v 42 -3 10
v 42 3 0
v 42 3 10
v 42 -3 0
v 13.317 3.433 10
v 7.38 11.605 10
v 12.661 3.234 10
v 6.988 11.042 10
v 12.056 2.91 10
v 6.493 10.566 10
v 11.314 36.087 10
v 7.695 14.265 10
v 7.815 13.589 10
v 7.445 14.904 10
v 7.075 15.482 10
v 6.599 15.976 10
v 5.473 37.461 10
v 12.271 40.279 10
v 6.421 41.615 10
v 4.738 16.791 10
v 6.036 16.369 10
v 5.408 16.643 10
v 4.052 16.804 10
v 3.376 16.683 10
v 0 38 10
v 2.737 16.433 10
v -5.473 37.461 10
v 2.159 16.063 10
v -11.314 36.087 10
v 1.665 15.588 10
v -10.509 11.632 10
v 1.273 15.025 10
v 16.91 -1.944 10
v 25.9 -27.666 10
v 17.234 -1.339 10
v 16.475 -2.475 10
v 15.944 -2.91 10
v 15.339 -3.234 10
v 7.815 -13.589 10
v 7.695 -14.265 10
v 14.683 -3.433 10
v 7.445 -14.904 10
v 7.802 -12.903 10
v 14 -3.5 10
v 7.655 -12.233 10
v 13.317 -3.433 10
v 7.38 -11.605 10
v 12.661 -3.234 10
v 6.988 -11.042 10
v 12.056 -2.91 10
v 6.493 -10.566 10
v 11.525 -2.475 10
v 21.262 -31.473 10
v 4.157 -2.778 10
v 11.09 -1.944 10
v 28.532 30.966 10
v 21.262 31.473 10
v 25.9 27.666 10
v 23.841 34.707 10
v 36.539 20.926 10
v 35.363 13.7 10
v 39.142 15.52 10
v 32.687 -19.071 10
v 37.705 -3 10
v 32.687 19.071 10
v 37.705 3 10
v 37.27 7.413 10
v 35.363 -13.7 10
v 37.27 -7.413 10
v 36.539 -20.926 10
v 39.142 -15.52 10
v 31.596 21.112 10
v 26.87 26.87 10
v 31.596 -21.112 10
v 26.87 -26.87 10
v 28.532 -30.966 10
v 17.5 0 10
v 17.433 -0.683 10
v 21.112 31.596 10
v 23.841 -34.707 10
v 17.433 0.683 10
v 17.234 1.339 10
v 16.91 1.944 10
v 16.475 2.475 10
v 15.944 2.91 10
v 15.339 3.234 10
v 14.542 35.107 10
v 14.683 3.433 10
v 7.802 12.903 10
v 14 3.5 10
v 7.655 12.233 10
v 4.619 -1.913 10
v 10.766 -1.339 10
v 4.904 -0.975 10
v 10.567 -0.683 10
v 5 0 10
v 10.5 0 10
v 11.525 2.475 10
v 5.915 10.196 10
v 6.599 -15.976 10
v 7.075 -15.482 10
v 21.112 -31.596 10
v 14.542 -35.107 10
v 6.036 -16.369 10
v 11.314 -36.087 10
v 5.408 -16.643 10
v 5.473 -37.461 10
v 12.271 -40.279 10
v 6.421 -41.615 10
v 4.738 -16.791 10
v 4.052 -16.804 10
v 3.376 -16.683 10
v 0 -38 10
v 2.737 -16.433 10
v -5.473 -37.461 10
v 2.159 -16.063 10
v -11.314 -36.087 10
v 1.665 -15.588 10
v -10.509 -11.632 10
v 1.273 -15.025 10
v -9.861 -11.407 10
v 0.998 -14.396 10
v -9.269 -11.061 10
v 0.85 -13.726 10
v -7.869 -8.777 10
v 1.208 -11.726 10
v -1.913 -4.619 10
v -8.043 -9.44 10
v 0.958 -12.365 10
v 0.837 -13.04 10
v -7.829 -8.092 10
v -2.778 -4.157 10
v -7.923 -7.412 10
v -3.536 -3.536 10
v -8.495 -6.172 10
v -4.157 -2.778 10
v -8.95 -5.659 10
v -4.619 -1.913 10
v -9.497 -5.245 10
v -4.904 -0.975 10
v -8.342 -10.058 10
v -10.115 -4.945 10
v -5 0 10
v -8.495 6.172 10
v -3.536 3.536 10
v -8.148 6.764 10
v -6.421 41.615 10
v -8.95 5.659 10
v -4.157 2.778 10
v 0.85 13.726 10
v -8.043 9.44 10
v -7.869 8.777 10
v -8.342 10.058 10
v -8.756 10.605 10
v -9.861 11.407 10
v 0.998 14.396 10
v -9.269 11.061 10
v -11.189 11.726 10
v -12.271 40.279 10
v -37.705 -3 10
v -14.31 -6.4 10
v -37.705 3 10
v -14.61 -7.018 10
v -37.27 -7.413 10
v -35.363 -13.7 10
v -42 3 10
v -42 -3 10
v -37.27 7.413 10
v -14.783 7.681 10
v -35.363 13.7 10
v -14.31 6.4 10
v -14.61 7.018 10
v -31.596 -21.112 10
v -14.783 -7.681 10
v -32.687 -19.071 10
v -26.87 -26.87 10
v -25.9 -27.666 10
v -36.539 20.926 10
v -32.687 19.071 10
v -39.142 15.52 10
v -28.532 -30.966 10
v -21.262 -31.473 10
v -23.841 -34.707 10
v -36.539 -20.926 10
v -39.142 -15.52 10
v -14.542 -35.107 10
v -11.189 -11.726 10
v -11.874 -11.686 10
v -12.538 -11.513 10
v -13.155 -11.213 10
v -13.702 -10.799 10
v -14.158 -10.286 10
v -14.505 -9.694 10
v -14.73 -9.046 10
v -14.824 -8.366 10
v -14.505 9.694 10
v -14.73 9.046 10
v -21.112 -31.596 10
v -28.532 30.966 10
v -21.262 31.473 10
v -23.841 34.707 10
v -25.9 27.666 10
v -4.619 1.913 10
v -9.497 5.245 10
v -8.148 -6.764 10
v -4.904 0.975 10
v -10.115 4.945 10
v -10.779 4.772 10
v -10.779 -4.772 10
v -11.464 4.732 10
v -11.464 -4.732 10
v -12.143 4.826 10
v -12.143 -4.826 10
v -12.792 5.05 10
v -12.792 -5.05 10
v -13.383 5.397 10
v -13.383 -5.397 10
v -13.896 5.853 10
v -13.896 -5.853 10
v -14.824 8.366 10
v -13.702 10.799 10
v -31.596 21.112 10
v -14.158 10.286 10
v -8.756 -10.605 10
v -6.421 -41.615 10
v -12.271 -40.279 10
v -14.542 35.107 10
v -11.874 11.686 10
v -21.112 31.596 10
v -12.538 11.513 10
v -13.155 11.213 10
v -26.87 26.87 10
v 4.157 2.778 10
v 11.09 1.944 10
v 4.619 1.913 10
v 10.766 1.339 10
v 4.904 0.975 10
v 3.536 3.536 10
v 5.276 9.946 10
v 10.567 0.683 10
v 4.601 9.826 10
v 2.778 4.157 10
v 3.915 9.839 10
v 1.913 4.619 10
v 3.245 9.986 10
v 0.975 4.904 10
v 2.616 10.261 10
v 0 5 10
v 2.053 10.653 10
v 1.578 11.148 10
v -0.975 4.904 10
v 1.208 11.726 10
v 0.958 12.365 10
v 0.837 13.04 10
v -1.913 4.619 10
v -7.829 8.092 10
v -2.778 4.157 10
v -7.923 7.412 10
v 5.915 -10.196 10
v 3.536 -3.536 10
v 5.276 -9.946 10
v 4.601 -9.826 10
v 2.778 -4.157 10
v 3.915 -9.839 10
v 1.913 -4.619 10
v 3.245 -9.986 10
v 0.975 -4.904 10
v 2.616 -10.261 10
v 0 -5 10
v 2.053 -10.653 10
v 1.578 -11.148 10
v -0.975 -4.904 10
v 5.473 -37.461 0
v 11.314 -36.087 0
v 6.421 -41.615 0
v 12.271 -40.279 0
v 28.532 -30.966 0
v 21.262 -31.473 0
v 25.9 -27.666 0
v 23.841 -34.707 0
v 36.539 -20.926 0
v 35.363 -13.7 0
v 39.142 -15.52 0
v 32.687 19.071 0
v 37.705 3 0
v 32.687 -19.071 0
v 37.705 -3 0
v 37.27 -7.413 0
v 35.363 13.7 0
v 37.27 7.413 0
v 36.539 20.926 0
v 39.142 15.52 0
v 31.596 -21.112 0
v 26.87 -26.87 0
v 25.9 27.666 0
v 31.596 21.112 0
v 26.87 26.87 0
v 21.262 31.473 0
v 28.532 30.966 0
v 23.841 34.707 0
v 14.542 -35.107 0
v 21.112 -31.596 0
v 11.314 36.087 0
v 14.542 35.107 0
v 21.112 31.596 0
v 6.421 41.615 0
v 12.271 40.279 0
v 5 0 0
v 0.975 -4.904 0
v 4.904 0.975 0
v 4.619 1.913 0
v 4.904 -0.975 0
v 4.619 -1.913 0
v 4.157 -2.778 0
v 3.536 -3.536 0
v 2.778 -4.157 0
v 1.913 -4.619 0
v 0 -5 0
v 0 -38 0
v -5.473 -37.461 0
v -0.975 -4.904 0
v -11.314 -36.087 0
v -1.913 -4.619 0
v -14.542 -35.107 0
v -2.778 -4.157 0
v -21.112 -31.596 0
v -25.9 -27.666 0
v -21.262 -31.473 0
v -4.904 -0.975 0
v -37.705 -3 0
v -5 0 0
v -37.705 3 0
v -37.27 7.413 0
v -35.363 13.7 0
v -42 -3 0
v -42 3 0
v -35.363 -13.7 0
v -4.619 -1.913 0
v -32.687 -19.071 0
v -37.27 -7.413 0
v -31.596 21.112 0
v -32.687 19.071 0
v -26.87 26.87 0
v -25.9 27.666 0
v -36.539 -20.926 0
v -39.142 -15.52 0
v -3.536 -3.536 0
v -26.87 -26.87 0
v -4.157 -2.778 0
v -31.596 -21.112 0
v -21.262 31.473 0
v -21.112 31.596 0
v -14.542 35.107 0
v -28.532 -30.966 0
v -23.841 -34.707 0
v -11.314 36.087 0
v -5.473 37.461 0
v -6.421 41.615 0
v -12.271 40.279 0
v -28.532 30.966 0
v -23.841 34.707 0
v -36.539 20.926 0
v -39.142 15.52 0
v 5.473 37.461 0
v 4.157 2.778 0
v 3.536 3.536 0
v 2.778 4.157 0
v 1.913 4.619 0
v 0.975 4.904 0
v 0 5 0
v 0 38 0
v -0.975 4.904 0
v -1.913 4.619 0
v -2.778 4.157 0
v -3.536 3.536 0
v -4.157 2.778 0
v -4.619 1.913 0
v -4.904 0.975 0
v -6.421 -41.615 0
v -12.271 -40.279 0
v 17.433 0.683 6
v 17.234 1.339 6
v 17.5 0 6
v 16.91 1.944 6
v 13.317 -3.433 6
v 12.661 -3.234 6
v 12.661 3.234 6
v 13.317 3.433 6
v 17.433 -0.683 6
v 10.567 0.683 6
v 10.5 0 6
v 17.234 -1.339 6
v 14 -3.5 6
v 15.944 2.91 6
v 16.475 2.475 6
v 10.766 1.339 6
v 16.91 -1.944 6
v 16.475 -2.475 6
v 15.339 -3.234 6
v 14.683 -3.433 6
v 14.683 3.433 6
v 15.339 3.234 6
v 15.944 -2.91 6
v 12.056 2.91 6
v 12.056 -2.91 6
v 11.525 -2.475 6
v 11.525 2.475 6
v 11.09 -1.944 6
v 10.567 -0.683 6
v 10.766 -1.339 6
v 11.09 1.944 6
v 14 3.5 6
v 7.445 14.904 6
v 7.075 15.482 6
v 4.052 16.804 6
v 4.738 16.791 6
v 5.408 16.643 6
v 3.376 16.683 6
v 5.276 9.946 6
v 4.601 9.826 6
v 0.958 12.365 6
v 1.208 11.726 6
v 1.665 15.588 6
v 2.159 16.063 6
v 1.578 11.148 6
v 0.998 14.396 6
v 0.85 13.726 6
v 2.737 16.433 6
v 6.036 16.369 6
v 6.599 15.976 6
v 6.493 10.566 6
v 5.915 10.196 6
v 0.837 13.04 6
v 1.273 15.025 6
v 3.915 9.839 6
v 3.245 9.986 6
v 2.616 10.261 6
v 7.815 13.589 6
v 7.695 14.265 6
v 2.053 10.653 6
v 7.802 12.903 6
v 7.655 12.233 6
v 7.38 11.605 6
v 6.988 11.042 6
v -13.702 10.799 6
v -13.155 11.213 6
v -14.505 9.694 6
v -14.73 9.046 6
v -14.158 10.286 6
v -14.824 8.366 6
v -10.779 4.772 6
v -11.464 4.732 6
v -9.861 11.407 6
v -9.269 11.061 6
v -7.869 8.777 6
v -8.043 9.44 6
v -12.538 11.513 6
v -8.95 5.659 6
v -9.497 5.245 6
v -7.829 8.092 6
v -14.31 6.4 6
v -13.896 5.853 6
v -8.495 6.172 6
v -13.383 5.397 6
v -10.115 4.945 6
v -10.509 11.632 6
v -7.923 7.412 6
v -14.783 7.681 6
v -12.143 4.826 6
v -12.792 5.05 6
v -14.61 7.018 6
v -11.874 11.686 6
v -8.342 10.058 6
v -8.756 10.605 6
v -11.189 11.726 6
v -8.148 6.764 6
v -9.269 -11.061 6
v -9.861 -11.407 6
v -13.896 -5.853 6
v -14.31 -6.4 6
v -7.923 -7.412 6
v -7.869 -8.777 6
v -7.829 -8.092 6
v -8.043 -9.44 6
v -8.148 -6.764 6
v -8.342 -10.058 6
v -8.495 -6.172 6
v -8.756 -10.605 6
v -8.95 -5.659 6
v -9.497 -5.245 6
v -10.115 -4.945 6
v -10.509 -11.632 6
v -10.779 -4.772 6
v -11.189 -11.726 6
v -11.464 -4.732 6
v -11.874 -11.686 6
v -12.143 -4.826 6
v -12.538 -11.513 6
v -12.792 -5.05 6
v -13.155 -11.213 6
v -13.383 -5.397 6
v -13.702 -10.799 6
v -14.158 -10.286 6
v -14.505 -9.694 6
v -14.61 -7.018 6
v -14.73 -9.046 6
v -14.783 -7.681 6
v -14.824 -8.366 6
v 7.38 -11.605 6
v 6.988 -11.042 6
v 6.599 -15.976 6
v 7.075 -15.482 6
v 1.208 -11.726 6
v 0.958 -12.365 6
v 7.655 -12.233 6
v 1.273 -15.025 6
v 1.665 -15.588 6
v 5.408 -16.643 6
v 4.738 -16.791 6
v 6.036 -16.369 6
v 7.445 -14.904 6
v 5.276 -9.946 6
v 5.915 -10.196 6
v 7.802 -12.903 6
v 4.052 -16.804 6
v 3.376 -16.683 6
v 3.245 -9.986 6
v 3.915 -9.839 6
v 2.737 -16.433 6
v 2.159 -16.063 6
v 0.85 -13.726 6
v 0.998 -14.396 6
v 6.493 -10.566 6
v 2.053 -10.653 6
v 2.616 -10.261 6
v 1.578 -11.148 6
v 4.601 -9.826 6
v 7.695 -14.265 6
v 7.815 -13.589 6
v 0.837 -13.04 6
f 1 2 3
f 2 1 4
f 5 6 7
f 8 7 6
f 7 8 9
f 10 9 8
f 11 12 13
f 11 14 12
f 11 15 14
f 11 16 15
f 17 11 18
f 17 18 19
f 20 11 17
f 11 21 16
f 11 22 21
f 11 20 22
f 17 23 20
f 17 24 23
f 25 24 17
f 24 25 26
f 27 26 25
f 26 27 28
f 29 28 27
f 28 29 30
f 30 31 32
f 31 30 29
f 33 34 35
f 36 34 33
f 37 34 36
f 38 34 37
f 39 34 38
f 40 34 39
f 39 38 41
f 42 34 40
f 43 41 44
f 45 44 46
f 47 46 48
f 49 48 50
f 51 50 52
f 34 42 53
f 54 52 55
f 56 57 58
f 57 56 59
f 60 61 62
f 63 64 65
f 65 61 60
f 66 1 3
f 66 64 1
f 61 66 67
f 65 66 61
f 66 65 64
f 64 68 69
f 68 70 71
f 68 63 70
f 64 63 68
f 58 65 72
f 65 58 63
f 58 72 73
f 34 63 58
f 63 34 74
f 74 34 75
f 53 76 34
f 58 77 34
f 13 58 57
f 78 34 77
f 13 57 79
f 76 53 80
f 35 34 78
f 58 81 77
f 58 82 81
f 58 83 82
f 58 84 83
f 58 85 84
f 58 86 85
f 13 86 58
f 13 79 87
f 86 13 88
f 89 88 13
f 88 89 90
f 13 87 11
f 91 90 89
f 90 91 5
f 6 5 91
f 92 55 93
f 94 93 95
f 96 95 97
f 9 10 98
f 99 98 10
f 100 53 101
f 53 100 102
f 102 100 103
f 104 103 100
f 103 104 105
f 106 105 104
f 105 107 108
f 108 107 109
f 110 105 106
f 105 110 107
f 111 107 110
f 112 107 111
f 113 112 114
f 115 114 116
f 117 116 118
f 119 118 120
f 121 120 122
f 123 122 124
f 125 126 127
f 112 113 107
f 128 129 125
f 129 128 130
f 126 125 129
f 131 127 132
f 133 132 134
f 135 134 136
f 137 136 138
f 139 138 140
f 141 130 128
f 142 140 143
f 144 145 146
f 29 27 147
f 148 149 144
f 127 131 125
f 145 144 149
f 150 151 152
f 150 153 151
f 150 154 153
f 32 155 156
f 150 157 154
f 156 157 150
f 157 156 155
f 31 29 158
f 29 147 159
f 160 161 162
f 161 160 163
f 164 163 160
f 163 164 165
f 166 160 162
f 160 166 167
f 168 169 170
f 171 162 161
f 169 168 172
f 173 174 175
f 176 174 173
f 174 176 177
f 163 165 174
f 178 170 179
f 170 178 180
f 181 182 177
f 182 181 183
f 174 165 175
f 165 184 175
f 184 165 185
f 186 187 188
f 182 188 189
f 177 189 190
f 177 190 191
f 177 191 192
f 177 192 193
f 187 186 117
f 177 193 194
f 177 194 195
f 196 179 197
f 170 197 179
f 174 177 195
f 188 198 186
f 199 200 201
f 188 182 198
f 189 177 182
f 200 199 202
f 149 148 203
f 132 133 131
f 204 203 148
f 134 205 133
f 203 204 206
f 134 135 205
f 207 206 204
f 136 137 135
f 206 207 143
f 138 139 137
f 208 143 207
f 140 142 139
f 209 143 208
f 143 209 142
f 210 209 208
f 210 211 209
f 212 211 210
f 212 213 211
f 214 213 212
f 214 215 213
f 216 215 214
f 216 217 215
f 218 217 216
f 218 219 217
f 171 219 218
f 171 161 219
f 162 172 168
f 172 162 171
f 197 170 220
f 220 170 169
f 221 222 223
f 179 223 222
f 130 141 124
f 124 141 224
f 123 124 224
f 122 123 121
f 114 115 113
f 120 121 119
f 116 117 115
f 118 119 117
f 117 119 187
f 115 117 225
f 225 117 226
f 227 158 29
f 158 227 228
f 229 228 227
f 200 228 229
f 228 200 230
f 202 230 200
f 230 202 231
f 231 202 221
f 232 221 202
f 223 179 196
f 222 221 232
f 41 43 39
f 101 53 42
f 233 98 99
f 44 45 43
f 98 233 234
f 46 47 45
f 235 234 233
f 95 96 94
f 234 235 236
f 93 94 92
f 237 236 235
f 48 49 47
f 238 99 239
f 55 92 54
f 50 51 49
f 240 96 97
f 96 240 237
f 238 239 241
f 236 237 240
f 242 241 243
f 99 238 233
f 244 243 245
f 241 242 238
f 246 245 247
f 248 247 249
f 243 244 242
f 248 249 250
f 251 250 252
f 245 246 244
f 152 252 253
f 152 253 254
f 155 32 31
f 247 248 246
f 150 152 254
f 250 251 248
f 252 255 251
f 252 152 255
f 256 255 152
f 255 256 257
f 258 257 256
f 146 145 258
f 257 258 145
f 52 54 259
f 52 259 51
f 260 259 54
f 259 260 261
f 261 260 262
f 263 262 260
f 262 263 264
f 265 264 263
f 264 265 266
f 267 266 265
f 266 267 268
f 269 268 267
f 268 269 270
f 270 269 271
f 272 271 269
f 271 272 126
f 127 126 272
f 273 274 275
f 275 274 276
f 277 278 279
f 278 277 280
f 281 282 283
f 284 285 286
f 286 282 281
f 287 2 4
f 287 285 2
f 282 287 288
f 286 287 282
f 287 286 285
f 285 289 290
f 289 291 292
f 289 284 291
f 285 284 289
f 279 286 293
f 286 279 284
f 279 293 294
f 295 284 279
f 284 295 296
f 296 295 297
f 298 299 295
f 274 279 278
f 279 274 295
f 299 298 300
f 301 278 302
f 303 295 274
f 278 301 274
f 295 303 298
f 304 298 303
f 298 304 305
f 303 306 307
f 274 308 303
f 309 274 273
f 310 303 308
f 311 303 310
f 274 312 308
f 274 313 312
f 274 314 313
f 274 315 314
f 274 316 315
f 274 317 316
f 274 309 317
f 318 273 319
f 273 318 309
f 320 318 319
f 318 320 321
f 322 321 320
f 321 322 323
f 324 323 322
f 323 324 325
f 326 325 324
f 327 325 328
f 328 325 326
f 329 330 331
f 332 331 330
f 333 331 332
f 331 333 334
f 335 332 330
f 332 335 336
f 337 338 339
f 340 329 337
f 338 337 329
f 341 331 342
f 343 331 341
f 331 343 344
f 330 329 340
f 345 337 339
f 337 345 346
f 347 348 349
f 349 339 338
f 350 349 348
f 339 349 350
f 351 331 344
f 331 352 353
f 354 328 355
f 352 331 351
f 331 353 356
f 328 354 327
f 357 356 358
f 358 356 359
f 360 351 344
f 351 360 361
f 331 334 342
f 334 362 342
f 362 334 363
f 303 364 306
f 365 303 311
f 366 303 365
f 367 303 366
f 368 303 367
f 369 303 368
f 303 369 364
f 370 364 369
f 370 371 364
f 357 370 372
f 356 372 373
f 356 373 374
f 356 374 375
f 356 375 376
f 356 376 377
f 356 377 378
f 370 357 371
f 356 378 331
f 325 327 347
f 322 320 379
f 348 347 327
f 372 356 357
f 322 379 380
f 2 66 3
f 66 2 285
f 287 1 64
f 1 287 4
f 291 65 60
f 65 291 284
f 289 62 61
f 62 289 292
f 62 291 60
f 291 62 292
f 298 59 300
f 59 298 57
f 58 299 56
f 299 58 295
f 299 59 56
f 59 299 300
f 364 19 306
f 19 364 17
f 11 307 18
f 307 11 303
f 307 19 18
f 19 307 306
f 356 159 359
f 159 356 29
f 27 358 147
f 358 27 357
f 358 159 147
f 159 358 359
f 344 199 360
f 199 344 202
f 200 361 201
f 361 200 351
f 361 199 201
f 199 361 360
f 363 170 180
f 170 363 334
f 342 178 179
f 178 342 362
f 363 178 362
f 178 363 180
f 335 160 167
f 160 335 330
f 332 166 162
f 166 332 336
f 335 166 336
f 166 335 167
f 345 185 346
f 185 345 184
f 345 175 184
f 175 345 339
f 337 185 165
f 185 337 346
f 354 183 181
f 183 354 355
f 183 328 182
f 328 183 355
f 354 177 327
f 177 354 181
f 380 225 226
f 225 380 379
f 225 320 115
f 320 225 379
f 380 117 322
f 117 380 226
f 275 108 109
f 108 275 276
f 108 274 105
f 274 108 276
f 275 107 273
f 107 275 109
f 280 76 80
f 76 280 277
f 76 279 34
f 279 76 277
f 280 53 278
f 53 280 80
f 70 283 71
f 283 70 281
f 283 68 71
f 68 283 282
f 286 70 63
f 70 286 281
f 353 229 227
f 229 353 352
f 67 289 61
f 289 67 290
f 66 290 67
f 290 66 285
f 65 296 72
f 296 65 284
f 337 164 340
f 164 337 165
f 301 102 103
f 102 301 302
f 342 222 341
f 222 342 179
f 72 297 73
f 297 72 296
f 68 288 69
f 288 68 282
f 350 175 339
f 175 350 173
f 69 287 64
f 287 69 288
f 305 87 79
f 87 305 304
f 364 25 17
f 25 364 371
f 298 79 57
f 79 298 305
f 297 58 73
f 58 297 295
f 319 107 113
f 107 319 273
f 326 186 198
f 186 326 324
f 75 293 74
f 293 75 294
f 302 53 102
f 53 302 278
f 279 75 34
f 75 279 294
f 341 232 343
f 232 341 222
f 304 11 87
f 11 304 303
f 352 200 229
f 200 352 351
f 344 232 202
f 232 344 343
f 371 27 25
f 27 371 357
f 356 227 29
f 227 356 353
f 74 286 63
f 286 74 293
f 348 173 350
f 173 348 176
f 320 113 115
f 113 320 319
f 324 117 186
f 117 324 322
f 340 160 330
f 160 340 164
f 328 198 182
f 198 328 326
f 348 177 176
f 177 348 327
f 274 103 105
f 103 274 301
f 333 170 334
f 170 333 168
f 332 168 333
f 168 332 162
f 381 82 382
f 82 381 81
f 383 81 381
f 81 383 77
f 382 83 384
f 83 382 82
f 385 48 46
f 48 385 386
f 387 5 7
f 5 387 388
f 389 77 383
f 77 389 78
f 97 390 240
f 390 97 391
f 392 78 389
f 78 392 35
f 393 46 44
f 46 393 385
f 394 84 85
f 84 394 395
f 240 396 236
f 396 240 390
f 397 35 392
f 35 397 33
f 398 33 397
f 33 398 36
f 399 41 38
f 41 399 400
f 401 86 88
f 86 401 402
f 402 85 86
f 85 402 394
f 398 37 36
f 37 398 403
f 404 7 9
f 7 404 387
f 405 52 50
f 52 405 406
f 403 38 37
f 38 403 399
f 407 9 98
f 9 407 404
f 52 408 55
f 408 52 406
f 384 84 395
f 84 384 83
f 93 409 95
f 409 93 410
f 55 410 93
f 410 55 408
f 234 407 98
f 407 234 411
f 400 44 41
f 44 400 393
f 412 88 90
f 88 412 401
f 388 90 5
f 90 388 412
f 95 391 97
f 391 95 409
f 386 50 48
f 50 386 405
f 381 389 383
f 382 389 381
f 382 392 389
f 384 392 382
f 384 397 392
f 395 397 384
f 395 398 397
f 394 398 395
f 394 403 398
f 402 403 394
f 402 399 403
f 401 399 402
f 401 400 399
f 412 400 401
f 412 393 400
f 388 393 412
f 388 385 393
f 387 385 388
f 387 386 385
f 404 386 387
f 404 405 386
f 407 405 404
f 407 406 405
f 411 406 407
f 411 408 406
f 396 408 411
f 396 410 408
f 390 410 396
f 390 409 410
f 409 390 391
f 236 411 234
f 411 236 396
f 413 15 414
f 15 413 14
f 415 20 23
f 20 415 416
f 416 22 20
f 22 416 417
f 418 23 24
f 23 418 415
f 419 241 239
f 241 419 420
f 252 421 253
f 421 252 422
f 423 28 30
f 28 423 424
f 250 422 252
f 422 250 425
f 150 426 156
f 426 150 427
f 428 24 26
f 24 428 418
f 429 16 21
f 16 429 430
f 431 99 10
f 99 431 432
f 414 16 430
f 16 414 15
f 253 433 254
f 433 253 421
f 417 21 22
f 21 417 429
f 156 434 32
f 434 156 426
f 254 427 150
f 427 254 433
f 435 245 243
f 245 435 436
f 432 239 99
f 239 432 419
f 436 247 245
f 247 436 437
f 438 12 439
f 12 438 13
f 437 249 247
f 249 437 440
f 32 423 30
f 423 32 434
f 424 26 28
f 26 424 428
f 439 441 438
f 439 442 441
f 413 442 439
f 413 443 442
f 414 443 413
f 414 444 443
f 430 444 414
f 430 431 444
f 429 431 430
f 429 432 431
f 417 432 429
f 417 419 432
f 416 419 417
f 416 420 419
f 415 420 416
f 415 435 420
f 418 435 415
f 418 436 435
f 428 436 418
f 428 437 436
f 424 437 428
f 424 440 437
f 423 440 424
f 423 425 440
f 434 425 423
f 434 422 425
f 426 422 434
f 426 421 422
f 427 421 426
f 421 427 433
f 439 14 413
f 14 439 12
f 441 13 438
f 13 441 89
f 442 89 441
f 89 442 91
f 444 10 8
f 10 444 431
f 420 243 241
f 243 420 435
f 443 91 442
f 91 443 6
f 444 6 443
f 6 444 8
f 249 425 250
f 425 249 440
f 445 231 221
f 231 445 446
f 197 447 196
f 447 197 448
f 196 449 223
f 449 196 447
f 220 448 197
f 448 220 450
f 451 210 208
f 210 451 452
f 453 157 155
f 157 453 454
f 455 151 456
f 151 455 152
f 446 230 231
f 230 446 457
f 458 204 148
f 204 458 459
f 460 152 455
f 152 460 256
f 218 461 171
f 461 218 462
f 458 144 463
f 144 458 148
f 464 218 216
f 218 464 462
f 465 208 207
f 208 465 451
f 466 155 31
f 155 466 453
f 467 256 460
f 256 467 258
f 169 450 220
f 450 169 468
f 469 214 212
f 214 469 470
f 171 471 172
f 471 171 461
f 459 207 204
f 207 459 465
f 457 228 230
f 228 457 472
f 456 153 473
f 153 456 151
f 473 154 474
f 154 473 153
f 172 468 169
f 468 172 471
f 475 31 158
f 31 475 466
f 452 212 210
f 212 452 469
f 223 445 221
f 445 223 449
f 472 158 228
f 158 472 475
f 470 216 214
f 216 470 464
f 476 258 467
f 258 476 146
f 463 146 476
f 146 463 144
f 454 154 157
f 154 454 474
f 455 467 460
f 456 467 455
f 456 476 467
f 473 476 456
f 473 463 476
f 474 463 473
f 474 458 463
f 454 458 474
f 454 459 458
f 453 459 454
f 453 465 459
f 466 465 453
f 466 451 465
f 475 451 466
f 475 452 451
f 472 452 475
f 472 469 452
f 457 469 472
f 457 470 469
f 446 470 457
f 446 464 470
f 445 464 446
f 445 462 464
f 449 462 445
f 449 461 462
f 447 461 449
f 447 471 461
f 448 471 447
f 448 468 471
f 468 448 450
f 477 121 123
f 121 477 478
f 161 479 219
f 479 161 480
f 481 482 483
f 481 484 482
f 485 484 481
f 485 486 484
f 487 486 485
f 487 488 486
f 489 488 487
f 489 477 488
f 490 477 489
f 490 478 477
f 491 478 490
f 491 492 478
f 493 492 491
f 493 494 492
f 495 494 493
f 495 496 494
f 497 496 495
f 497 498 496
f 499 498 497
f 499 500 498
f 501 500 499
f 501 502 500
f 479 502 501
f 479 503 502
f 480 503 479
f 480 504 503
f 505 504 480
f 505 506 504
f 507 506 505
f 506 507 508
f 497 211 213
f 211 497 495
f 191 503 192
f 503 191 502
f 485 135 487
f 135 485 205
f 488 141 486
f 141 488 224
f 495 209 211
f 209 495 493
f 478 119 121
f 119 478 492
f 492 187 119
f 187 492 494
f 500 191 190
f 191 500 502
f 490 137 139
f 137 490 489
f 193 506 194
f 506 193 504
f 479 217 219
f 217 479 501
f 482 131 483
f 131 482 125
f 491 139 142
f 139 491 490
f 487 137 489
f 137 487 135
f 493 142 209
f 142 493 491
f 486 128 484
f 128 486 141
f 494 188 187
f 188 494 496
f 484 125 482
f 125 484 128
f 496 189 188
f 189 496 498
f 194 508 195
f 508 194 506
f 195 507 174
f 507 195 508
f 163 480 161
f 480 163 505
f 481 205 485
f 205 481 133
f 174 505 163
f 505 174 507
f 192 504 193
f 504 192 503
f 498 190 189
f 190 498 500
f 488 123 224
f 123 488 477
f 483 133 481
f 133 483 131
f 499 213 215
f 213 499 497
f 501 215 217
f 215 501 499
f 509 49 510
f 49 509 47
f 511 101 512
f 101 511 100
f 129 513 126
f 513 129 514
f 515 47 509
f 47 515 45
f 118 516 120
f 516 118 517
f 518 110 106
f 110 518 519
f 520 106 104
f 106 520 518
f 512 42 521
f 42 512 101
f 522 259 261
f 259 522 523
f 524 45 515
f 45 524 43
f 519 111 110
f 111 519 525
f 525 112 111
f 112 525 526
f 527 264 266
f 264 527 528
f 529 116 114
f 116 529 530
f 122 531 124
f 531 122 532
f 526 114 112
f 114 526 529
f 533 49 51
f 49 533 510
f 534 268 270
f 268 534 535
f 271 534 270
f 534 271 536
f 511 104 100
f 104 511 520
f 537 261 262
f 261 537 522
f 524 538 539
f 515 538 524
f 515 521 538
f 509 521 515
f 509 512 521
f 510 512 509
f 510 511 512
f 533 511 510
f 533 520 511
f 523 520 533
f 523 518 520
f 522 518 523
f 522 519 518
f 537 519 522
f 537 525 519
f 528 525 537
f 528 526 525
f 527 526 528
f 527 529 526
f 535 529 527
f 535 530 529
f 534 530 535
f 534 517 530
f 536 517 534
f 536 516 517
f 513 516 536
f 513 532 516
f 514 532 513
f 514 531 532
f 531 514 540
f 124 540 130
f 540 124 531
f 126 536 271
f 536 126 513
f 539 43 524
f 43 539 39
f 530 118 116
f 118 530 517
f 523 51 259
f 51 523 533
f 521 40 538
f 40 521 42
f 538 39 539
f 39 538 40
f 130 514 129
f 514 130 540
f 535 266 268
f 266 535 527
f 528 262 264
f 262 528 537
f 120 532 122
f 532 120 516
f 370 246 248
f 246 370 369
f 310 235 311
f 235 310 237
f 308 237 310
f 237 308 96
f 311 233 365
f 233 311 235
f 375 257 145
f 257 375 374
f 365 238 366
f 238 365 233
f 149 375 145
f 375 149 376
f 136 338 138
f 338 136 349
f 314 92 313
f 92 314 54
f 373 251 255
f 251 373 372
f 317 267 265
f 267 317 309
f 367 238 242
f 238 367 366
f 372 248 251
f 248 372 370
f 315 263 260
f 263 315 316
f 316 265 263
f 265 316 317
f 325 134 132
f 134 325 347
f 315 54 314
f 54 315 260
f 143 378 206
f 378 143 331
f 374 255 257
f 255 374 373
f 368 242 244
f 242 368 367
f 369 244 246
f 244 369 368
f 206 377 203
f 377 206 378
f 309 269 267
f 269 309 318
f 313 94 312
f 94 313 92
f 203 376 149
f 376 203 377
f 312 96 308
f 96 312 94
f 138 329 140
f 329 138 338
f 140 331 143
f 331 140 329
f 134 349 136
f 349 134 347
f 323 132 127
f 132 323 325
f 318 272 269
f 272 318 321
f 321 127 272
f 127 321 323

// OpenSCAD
$fn = 32;

// ----------------------------------------------------------------------
// Spur blank: lightened gear blank
// ----------------------------------------------------------------------

// --- parameters (mm) ---
disc_r = 38;              // blank root radius
disc_t = 10;              // blank thickness
n_teeth = 14;             // stub tooth count
tooth_w = 6;              // tooth width at the root
tooth_h = 4;              // tooth height above the root
bore_r = 5;               // central bore radius
ring_r = 14;              // lightening pocket ring radius
pocket_r = 3.5;           // lightening pocket radius

out_r = disc_r + tooth_h;  // tip radius
bbox_x = 84.0;  // measured width over the teeth
bbox_y = 83.23;  // measured depth over the teeth

difference() {
union() {
  cylinder(r = disc_r, h = disc_t);
  for (i = [0 : n_teeth - 1])
    rotate([0, 0, i * 360 / n_teeth])
      translate([disc_r - 1, -tooth_w / 2, 0])
        cube([tooth_h + 1, tooth_w, disc_t]);
}
  translate([0, 0, -1]) cylinder(r = bore_r, h = disc_t + 2);
  for (i = [0 : 5])
    rotate([0, 0, i * 72])
      translate([ring_r, 0, disc_t - 4])
        cylinder(r = pocket_r, h = 5);
}
